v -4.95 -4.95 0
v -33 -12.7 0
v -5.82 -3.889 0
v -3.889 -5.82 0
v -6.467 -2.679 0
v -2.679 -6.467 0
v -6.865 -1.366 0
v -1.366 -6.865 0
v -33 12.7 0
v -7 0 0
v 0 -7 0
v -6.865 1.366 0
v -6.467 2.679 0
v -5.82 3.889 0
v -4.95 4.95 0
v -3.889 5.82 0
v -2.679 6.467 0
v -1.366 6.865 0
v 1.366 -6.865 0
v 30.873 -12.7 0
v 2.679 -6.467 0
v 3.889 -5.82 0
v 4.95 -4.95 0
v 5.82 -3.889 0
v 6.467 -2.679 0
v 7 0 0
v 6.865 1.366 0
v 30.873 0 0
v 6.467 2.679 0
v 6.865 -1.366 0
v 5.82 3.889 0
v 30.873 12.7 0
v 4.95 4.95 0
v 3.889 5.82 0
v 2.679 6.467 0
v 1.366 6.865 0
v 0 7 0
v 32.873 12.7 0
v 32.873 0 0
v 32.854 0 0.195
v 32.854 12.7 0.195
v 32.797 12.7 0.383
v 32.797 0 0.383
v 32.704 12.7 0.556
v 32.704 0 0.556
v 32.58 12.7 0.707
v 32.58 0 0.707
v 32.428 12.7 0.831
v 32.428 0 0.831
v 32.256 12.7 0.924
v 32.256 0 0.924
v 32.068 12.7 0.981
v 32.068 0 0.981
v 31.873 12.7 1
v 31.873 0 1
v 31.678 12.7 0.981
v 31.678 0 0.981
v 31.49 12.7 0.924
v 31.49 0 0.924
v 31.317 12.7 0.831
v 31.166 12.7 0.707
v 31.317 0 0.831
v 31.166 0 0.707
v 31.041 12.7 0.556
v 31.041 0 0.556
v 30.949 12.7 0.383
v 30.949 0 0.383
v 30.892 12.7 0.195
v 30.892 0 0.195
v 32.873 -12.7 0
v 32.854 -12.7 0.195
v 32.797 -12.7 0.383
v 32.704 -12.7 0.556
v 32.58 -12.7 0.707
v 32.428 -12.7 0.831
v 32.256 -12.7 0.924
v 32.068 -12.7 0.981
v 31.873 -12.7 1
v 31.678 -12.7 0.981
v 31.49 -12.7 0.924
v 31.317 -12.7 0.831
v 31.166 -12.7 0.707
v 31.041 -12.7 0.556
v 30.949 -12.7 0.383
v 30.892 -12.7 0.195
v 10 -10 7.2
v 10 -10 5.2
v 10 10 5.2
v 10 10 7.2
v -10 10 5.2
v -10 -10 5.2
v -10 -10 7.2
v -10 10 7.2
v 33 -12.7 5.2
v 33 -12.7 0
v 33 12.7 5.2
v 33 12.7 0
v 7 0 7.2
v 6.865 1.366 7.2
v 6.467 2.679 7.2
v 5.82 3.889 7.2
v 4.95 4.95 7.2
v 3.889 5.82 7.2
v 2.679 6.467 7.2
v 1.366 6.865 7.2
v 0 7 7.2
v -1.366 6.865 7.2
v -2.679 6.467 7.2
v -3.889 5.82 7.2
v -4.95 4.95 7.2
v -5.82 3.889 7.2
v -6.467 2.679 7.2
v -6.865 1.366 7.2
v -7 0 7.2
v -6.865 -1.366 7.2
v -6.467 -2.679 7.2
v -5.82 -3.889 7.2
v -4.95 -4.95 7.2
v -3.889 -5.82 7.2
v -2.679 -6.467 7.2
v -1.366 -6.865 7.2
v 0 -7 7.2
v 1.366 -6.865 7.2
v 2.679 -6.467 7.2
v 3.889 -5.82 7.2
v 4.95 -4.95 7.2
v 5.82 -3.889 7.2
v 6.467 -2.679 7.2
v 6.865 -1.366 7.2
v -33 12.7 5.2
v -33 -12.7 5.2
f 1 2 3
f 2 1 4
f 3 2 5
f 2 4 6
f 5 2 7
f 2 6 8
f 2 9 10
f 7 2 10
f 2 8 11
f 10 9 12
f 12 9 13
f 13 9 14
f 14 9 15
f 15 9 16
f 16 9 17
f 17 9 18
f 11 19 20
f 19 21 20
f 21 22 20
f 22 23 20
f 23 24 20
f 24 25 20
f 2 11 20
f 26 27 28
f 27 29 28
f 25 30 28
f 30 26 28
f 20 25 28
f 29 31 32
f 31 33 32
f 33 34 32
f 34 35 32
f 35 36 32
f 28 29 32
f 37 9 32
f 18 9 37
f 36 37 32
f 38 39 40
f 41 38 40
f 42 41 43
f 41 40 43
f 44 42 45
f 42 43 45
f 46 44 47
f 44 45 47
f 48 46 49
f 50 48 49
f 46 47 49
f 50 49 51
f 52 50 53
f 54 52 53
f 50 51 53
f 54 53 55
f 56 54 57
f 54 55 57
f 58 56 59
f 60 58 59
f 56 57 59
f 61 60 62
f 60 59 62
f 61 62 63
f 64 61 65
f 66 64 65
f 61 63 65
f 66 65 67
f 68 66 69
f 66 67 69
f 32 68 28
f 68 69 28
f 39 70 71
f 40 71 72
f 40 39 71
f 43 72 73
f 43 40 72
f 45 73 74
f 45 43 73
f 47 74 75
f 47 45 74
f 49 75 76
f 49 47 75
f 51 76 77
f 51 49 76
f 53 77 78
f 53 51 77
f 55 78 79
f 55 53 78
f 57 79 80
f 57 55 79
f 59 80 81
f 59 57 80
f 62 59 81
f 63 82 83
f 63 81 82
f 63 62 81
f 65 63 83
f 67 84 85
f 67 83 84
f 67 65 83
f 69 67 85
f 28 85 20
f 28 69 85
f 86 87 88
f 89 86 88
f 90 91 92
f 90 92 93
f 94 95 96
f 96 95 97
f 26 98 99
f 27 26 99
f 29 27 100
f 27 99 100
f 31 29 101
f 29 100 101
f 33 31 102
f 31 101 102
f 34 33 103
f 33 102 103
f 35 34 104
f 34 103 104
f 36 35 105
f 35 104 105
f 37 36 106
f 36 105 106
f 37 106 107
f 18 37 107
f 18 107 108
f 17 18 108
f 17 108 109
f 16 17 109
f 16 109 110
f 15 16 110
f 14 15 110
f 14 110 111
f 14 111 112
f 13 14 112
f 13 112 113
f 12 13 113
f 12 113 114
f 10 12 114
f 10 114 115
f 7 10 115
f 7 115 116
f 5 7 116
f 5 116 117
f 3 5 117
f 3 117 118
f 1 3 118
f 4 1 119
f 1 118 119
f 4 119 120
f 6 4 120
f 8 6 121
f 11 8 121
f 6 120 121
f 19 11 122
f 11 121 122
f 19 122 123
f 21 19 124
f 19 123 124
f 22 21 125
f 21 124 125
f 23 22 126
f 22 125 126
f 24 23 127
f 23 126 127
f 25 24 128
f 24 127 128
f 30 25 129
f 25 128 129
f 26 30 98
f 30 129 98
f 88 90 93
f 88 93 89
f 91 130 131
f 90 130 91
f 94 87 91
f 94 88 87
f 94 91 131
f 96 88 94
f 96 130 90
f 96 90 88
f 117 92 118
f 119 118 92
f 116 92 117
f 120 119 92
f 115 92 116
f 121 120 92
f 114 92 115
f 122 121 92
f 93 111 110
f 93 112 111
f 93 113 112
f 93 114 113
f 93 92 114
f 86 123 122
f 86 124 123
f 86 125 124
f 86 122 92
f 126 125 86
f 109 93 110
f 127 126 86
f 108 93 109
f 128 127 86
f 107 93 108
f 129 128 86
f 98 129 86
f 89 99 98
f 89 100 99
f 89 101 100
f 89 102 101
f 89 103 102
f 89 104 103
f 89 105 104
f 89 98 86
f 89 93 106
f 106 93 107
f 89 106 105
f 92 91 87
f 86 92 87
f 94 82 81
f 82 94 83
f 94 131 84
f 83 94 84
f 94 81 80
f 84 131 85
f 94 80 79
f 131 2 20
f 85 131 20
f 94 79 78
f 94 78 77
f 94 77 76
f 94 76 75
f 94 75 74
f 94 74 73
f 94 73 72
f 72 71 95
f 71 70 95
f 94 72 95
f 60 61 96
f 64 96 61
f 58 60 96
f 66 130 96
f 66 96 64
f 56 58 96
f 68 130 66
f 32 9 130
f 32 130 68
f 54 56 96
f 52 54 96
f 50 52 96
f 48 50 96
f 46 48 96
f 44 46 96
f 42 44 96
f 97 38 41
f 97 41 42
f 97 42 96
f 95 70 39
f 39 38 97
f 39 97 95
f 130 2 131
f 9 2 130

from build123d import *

# Parameters (mm, degrees)
F0_W          = 66
F0_H          = 25.4
F1_DEPTH      = 5.2
F2_W          = 20
F2_H          = 20
F3_DEPTH      = 2
F4_R          = 7
F5_DEPTH      = 16.04009
F6_R          = 1
F7_DEPTH      = 25
F7_DEPTH_BACK = 25


with BuildPart() as f1:
    # F0 (on Top) → F1 (new body)
    with BuildSketch(Plane.XY):
        Rectangle(F0_W, F0_H)
    extrude(amount=F1_DEPTH)

    # F2 (on face) → F3 (join)
    with BuildSketch(Plane.XY.offset(5.2)):
        Rectangle(F2_W, F2_H)
    extrude(amount=F3_DEPTH)

    # F4 (on face) → F5 (cut)
    with BuildSketch(Plane.XY.offset(7.2)):
        Circle(F4_R)
    extrude(amount=-F5_DEPTH, mode=Mode.SUBTRACT)

    # F6 (on Front) → F7 (cut, two sides)
    with BuildSketch(Plane.XZ) as f7_sk:
        with Locations((31.872865, 0)):
            Circle(F6_R)
    extrude(amount=F7_DEPTH, mode=Mode.SUBTRACT)
    extrude(f7_sk.sketch, amount=-F7_DEPTH_BACK, mode=Mode.SUBTRACT)


solid = f1.part
